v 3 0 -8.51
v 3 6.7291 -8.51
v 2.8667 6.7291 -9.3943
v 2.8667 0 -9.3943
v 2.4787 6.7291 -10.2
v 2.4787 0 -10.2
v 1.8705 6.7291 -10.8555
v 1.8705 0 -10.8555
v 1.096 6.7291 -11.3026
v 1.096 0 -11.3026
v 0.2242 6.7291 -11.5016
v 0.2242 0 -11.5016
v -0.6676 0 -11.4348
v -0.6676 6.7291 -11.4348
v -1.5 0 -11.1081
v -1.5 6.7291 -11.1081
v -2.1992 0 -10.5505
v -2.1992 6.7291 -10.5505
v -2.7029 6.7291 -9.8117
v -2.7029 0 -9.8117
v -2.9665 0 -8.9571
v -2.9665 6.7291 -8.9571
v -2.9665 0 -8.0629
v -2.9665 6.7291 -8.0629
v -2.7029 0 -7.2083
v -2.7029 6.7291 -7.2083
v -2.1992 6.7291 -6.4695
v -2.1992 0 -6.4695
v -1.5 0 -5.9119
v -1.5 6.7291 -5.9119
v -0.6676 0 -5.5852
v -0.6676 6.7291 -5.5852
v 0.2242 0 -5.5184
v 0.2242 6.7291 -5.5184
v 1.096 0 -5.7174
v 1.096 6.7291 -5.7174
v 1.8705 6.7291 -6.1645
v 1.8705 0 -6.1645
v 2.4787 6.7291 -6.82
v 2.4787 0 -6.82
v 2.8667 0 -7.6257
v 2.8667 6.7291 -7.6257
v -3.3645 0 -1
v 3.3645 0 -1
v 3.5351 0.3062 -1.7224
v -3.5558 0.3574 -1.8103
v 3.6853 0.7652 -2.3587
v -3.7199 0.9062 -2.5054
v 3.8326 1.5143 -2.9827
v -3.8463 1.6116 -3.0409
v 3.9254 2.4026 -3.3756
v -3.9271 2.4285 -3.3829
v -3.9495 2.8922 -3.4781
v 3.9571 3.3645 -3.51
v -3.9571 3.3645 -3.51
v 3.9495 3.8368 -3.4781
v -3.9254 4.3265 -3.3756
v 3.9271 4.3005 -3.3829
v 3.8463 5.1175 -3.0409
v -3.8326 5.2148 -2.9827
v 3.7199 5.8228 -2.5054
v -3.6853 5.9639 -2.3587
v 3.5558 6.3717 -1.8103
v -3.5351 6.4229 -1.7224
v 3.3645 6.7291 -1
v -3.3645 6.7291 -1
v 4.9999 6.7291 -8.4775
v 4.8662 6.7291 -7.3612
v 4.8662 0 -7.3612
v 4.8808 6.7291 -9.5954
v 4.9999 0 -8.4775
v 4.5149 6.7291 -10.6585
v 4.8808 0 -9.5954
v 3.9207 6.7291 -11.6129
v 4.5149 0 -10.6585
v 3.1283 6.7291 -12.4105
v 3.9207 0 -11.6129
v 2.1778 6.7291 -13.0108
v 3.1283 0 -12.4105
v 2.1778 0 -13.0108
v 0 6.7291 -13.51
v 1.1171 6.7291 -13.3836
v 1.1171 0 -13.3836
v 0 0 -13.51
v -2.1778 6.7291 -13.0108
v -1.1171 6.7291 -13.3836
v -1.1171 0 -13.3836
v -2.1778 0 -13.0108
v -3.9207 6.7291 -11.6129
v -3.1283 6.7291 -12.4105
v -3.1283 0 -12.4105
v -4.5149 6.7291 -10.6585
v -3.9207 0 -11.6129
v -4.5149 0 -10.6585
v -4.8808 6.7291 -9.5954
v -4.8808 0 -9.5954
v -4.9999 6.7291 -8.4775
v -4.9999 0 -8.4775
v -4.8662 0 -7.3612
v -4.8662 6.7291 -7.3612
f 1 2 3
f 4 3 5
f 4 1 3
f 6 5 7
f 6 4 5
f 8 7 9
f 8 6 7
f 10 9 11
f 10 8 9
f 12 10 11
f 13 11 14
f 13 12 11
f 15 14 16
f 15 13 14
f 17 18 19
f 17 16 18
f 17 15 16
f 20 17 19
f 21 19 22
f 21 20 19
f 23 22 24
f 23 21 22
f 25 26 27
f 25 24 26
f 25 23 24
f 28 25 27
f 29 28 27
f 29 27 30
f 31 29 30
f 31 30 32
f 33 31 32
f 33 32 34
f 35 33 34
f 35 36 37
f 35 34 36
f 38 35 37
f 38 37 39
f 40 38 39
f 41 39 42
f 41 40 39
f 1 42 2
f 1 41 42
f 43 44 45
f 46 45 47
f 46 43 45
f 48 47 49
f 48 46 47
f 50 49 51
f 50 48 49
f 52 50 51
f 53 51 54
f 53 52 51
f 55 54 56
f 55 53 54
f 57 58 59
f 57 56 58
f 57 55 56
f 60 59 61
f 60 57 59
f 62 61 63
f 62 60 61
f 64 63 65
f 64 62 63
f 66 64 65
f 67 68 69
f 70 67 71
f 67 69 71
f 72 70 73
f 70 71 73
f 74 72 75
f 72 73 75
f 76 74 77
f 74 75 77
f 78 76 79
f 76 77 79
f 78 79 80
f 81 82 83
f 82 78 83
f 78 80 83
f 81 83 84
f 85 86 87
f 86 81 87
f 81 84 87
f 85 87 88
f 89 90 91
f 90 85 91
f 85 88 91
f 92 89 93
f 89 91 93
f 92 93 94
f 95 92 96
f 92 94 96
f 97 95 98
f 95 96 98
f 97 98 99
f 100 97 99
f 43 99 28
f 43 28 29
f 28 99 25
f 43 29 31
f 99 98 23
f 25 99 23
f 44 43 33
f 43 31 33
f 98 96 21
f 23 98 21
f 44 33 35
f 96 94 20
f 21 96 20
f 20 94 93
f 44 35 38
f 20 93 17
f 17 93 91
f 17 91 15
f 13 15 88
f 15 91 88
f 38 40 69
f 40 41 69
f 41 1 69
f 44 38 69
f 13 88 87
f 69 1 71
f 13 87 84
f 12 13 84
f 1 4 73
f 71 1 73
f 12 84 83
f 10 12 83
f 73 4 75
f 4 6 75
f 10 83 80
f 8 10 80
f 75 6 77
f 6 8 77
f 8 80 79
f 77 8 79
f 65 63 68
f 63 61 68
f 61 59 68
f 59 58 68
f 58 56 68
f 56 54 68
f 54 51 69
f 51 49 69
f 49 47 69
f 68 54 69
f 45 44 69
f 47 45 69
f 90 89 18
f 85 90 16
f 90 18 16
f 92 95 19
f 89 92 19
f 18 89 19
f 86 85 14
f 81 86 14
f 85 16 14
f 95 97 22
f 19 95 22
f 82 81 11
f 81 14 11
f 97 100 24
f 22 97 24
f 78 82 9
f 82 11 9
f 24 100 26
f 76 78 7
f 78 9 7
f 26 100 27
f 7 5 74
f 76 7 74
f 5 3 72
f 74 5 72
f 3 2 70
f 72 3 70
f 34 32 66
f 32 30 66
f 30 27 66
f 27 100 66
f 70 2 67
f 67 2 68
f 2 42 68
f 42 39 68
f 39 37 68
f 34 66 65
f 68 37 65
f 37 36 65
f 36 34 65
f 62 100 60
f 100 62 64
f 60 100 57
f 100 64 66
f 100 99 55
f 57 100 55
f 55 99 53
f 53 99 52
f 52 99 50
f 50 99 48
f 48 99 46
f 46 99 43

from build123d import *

# Parameters (mm, degrees)
CROQUIS1_R                 = 3
SALIENTE_EXTRUIR2_DEPTH    = 10
CROQUIS2_R                 = 3.51
CORTAR_EXTRUIR1_DEPTH      = 6
CORTAR_EXTRUIR1_DEPTH_BACK = 6
CORTAR_EXTRUIR2_DEPTH      = 13.51


with BuildPart() as part:
    # Croquis1 → Saliente-Extruir2 (new body)
    with BuildSketch(Plane(origin=(0, 0, 0), x_dir=(1, 0, 0), z_dir=(0, 1, 0))):
        with BuildLine():
            ThreePointArc((4.866240612, 7.361217033), (0, 13.51), (-4.866240612, 7.361217033))
            Line((-4.866240612, 7.361217033), (-3.364535629, 1))
            Line((-3.364535629, 1), (3.364535629, 1))
            Line((3.364535629, 1), (4.866240612, 7.361217033))
        make_face()
        with Locations((0, 8.51)):
            Circle(CROQUIS1_R, mode=Mode.SUBTRACT)
    extrude(amount=SALIENTE_EXTRUIR2_DEPTH)

    # Croquis2 → Cortar-Extruir1 (cut, two sides)
    with BuildSketch(Plane(origin=(0, 0, 0), x_dir=(0, 0, -1), z_dir=(1, 0, 0))) as cortar_extruir1_sk:
        with Locations((0, 3.364535629)):
            Circle(CROQUIS2_R)
    extrude(amount=CORTAR_EXTRUIR1_DEPTH, mode=Mode.SUBTRACT)
    extrude(cortar_extruir1_sk.sketch, amount=-CORTAR_EXTRUIR1_DEPTH_BACK, mode=Mode.SUBTRACT)

    # Croquis4 → Cortar-Extruir2 (cut, through all)
    with BuildSketch(Plane.XY.offset(-1)):
        Polygon((-10.381986268, 6.729071258), (12.651385212, 6.729071258), (6.885028009, 11.685095577), (-4.618478965, 12.095500912), align=None)
    extrude(amount=-CORTAR_EXTRUIR2_DEPTH, mode=Mode.SUBTRACT)


solid = part.part
